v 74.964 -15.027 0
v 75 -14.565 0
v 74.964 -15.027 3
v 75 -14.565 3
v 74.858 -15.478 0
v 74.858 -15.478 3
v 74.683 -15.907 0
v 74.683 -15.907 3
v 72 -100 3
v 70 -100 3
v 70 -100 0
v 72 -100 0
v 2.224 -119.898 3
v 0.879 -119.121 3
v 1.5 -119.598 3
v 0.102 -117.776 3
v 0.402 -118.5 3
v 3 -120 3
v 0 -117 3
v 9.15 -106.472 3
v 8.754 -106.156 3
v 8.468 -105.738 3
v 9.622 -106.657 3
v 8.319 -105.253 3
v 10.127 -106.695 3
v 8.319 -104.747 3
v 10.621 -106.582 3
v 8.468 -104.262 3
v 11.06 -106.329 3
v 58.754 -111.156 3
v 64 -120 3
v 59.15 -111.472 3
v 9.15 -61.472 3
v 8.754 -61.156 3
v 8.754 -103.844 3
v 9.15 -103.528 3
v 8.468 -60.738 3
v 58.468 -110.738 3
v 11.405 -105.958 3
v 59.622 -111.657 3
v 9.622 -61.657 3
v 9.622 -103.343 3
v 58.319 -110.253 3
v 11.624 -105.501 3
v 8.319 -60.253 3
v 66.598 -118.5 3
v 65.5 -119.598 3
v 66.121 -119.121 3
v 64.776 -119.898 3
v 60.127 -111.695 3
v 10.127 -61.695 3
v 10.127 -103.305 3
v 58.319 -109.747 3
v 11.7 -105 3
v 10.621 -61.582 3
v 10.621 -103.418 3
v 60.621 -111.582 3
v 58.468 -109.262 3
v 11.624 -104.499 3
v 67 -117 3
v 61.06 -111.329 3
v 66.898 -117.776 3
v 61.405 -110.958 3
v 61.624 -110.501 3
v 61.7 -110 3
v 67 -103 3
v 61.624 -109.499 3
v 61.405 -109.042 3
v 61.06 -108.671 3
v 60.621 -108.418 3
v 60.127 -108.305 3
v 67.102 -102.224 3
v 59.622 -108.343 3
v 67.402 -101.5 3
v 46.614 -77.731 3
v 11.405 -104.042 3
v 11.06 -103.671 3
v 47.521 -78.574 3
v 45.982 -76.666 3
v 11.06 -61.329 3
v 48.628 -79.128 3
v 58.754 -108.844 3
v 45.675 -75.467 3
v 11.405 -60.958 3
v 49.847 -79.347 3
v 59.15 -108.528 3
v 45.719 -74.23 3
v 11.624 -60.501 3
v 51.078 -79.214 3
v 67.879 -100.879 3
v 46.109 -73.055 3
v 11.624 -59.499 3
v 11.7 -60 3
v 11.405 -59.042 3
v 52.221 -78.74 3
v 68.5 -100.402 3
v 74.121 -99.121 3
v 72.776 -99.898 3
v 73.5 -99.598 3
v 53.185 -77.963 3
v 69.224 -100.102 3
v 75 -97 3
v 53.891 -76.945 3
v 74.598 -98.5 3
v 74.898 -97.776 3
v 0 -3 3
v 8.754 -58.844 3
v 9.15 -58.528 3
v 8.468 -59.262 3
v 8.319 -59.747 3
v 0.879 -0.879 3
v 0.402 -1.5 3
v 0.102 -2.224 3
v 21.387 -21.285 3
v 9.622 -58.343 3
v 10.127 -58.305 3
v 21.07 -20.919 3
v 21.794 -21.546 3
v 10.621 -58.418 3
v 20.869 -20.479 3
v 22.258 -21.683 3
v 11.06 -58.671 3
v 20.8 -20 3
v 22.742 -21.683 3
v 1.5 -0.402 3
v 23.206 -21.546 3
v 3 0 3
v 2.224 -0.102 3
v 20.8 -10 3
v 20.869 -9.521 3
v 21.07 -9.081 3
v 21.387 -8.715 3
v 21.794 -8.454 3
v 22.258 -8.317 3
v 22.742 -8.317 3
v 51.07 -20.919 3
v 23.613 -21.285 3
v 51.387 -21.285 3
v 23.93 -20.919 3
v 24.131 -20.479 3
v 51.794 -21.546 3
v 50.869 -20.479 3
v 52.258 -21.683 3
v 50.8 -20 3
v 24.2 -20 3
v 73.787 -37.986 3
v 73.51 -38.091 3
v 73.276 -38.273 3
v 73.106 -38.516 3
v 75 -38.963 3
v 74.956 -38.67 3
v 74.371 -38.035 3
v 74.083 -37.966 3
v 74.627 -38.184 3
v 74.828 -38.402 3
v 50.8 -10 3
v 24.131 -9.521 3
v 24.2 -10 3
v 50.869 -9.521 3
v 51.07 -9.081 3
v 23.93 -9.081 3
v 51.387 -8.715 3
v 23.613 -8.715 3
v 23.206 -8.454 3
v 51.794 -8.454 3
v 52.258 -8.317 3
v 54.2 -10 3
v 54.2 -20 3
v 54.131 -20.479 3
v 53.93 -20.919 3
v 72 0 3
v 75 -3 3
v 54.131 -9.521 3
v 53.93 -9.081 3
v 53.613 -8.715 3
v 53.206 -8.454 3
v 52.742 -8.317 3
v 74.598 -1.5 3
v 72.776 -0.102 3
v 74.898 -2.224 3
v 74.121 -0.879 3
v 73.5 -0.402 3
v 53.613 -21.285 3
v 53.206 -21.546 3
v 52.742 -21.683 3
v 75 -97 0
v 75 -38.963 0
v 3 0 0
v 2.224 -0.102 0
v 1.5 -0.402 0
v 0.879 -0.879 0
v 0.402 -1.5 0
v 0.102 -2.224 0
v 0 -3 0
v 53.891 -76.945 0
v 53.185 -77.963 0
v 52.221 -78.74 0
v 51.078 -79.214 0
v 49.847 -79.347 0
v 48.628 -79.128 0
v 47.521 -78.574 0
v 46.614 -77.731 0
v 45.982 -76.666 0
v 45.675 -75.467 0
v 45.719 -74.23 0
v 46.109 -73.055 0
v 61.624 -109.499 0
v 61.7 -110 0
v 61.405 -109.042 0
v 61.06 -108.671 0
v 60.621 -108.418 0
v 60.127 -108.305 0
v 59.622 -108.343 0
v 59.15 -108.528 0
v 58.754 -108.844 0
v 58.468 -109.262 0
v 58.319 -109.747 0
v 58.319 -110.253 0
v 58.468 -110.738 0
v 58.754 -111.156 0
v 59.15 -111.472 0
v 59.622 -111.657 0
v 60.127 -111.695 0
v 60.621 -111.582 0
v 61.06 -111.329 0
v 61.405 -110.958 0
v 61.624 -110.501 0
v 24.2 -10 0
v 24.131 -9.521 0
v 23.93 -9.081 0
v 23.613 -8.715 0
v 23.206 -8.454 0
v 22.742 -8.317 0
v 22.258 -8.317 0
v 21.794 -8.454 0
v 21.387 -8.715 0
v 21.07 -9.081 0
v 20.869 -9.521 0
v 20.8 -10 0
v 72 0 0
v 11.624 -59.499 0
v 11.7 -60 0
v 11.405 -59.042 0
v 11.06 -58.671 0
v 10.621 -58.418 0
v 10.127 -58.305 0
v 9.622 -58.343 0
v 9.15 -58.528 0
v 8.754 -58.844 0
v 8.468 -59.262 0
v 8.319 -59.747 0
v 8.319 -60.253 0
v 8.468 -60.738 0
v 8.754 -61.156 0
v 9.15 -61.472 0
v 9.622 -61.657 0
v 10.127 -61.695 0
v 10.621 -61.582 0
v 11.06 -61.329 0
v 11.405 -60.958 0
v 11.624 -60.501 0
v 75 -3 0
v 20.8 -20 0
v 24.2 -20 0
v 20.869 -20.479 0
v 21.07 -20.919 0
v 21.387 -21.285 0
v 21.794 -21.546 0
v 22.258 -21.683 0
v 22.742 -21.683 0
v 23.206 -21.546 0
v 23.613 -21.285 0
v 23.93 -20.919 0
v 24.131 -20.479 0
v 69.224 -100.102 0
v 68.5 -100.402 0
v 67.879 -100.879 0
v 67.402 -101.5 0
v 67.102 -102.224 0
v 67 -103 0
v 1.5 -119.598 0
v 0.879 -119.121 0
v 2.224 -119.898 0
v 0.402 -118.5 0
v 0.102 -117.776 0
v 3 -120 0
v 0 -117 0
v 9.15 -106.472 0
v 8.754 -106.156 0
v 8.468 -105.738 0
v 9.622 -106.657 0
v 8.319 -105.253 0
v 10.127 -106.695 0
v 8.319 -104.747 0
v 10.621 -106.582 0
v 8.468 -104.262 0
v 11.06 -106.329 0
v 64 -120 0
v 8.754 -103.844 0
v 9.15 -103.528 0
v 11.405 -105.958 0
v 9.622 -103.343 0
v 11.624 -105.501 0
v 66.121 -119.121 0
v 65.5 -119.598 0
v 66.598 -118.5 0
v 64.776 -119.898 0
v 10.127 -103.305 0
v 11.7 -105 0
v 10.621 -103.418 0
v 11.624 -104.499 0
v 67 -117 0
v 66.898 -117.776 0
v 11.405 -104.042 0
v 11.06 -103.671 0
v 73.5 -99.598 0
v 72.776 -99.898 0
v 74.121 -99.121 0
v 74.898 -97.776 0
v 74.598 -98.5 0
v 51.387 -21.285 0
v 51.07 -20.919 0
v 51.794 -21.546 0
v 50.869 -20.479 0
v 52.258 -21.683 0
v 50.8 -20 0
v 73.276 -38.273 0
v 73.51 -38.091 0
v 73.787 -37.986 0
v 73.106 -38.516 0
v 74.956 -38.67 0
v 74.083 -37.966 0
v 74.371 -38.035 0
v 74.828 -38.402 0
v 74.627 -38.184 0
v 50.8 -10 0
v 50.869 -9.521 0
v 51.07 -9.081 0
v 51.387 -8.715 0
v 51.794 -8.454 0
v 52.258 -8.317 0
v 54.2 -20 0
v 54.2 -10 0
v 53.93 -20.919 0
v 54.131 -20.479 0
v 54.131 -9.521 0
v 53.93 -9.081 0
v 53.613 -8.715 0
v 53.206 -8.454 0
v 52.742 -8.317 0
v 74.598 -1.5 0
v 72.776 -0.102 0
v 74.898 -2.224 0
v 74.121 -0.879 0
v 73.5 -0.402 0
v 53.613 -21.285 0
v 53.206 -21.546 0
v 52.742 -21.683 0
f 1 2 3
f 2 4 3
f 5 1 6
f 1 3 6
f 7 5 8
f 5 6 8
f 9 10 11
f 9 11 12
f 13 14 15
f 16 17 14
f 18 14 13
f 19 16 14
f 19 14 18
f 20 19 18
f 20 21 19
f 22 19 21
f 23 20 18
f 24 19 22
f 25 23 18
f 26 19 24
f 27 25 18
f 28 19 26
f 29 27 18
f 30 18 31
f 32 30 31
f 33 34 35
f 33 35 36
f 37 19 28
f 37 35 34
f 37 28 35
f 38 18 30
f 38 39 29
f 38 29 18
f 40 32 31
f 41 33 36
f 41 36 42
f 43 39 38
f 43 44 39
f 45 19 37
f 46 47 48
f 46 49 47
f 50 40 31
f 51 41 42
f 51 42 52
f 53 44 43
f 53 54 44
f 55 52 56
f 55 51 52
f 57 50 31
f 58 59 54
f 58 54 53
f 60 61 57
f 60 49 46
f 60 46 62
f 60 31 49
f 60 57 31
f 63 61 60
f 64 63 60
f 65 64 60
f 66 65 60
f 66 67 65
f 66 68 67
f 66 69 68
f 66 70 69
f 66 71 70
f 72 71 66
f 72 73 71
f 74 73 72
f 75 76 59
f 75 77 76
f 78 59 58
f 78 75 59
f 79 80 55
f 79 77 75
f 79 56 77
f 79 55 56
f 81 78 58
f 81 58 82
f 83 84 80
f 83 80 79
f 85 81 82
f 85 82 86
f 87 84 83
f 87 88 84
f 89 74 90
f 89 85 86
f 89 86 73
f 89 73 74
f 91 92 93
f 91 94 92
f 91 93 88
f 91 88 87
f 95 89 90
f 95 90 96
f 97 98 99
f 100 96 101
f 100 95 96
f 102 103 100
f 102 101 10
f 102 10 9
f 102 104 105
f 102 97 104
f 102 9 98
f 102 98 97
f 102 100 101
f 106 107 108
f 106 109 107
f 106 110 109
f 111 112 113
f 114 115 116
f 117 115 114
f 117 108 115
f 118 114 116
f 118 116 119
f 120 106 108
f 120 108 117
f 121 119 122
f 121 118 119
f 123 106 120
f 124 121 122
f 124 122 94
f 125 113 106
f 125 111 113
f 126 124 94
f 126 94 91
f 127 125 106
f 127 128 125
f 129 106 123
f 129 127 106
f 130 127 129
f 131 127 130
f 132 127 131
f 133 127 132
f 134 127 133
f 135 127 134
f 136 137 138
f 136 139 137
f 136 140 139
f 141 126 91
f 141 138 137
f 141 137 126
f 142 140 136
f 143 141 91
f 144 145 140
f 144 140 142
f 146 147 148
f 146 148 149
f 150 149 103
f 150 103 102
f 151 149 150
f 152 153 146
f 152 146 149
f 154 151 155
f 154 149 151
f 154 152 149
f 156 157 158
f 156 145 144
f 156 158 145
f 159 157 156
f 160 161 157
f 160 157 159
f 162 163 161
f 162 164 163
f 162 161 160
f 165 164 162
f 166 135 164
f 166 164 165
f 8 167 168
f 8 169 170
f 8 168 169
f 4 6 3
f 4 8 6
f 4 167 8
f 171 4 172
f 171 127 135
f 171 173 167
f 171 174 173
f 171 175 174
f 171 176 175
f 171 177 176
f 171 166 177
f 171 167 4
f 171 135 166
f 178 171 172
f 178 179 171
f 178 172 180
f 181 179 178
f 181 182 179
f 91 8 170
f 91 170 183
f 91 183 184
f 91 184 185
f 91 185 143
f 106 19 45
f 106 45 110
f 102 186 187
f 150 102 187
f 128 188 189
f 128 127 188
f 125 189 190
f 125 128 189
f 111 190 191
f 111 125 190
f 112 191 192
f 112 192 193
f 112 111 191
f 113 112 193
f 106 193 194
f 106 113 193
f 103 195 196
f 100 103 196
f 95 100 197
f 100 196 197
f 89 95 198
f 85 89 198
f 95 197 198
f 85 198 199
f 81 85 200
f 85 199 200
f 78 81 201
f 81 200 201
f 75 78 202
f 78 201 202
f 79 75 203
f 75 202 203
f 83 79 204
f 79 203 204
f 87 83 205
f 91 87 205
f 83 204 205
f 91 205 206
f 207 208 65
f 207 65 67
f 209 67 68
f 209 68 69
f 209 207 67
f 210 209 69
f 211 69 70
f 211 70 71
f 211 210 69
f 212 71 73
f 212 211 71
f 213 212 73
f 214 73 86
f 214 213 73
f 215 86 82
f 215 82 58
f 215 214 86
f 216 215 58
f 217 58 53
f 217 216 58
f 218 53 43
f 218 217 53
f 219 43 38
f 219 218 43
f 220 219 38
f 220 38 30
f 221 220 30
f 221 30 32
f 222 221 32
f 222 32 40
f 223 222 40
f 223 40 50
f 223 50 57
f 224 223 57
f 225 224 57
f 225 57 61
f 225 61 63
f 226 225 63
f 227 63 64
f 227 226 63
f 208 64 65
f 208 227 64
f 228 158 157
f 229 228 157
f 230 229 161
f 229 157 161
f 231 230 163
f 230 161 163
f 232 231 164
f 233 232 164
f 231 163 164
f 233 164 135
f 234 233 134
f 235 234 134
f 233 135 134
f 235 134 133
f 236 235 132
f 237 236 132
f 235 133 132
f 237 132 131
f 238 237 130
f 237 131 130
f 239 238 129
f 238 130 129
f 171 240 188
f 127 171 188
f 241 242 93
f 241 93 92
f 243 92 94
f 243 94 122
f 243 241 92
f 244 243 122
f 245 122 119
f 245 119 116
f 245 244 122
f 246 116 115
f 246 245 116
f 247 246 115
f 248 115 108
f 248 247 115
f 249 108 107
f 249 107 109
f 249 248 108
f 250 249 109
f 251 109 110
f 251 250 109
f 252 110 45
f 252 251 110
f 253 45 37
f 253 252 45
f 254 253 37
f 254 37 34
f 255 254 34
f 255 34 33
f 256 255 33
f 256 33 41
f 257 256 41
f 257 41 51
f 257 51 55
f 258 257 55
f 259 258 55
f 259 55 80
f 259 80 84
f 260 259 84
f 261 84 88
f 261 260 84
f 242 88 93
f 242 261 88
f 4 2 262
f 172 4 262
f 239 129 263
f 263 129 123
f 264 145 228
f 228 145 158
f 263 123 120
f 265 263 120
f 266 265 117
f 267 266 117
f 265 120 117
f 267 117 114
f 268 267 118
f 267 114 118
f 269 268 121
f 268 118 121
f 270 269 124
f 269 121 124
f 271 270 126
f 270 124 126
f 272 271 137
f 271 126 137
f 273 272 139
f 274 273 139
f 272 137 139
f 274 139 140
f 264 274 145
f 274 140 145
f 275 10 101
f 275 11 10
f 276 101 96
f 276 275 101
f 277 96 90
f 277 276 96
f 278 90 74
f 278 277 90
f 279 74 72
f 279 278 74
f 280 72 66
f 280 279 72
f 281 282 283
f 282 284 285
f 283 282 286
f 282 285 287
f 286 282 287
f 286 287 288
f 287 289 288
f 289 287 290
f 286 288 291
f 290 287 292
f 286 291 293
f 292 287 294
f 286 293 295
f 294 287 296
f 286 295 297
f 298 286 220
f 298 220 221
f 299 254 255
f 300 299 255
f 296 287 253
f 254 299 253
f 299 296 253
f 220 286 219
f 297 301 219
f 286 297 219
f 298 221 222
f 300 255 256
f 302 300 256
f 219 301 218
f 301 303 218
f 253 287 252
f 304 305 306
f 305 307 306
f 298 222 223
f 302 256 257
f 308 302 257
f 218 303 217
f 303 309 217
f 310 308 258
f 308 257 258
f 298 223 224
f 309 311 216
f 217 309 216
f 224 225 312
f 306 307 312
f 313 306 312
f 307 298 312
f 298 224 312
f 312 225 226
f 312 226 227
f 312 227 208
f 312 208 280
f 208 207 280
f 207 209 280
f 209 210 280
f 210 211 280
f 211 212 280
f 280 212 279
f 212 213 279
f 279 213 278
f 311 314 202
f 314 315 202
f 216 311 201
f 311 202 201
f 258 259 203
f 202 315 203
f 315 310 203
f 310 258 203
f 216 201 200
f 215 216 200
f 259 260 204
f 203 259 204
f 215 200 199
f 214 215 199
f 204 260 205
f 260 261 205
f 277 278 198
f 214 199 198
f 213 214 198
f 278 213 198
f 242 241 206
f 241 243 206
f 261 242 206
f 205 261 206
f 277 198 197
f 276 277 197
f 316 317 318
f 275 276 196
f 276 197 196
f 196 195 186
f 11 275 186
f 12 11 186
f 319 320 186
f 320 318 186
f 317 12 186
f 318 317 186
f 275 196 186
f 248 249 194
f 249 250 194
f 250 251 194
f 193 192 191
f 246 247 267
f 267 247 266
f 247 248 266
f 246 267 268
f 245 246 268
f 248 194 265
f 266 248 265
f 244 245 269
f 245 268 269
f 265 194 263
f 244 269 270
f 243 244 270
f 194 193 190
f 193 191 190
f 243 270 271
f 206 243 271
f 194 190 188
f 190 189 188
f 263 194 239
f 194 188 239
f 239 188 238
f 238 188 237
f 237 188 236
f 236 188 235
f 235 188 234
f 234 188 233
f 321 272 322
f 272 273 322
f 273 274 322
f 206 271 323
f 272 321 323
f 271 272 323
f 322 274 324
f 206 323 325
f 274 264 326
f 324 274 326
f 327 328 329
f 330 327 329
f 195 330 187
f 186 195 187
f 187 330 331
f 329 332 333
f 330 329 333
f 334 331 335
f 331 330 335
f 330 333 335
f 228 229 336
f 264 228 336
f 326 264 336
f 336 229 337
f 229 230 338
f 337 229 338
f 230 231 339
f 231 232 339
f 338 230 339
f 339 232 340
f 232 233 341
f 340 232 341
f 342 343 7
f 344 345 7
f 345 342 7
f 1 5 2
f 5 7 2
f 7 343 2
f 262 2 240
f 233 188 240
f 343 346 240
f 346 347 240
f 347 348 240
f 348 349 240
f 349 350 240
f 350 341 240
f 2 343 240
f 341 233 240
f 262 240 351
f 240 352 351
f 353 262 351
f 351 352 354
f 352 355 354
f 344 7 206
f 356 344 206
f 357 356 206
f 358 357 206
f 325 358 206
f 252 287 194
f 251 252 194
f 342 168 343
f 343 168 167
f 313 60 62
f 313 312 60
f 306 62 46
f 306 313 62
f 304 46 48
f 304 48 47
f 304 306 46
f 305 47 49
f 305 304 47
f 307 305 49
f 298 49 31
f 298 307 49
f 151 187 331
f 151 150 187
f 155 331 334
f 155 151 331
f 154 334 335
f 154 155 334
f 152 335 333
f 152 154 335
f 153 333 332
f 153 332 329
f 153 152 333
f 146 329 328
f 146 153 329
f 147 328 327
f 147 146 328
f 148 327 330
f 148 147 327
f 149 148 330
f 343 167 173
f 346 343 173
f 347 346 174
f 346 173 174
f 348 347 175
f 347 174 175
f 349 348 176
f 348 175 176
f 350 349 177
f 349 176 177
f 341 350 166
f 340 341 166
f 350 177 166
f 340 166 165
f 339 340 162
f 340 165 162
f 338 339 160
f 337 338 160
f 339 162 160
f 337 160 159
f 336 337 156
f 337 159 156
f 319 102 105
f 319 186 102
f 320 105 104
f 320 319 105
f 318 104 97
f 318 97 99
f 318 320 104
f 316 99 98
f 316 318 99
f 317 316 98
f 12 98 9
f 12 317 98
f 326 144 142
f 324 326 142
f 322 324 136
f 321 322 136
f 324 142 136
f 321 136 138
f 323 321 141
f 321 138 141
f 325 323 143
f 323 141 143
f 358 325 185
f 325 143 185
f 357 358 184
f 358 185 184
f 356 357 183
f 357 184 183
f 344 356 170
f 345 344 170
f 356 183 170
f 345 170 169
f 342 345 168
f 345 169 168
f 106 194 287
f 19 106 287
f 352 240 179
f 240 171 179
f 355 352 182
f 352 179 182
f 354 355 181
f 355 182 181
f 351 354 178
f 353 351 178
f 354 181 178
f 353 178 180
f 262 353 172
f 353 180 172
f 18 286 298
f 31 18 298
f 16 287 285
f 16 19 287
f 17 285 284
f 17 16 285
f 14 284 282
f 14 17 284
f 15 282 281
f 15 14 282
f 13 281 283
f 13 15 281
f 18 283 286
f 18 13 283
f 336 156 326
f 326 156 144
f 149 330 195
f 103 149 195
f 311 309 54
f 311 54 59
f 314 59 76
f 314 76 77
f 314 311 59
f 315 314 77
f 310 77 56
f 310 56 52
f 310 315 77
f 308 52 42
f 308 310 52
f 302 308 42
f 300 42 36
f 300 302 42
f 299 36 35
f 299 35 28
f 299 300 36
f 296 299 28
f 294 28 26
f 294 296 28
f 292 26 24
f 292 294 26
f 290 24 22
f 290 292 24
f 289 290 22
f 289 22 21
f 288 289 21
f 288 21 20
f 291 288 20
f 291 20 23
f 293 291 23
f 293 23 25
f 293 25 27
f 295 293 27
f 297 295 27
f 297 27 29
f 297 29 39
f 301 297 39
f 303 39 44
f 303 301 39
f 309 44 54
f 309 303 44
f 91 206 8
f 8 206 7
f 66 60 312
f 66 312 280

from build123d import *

# Parameters (mm, degrees)
SKETCH1_R           = 1.7
BOSS_EXTRUDE1_DEPTH = 3
FILLET1_R           = 3
CUT_EXTRUDE1_DEPTH  = 4
SKETCH3_W           = 8
SKETCH3_H           = 20
CUT_EXTRUDE2_DEPTH  = 4
FILLET2_R           = 3
FILLET3_R           = 1


with BuildPart() as part:
    # Sketch1 → Boss-Extrude1 (new body)
    with BuildSketch(Plane.XY):
        with BuildLine():
            Line((75, 0), (0, 0))
            Line((0, 0), (0, -120))
            Line((0, -120), (75, -120))
            Line((75, -120), (75, -34.726895702))
            Line((75, -34.726895702), (63.890758281, -56.94537914))
            Line((63.890758281, -56.94537914), (53.890758281, -76.94537914))
            ThreePointArc((53.890758281, -76.94537914), (48.05462086, -78.890758281), (46.109241719, -73.05462086))
            Line((46.109241719, -73.05462086), (56.109241719, -53.05462086))
            Line((56.109241719, -53.05462086), (75, -15.273104298))
            Line((75, -15.273104298), (75, 0))
        make_face()
        with Locations((10, -105)):
            Circle(SKETCH1_R, mode=Mode.SUBTRACT)
        with Locations((60, -110)):
            Circle(SKETCH1_R, mode=Mode.SUBTRACT)
        with Locations((10, -60)):
            Circle(SKETCH1_R, mode=Mode.SUBTRACT)
    extrude(amount=BOSS_EXTRUDE1_DEPTH)

    # Fillet1
    fillet1_edges = [part.edges().sort_by_distance(p)[0] for p in [
        (75, -120, 1.5),
        (0, -120, 1.5),
        (0, 0, 1.5),
        (75, 0, 1.5),
        (75, -15.273104298, 1.5),
    ]]
    fillet(fillet1_edges, radius=FILLET1_R)

    # Sketch2 → Cut-Extrude1 (cut, through all)
    with BuildSketch(Plane.XY.offset(3)):
        with BuildLine():
            Line((20.8, -10), (20.8, -20))
            ThreePointArc((20.8, -20), (22.5, -21.7), (24.2, -20))
            Line((24.2, -20), (24.2, -10))
            ThreePointArc((24.2, -10), (22.5, -8.3), (20.8, -10))
        make_face()
        with BuildLine():
            Line((50.8, -10), (50.8, -20))
            ThreePointArc((50.8, -20), (52.5, -21.7), (54.2, -20))
            Line((54.2, -20), (54.2, -10))
            ThreePointArc((54.2, -10), (52.5, -8.3), (50.8, -10))
        make_face()
    extrude(amount=-CUT_EXTRUDE1_DEPTH, mode=Mode.SUBTRACT)

    # Sketch3 → Cut-Extrude2 (cut, through all)
    with BuildSketch(Plane.XY.offset(3)):
        with Locations((71, -110)):
            Rectangle(SKETCH3_W, SKETCH3_H)
    extrude(amount=-CUT_EXTRUDE2_DEPTH, mode=Mode.SUBTRACT)

    # Fillet2
    fillet2_edges = [part.edges().sort_by_distance(p)[0] for p in [
        (75, -100, 1.5),
        (67, -120, 1.5),
        (67, -100, 1.5),
    ]]
    fillet(fillet2_edges, radius=FILLET2_R)

    # Fillet3
    fillet3_edges = [part.edges().sort_by_distance(p)[0] for p in [
        (75, -34.726895702, 1.5),
    ]]
    fillet(fillet3_edges, radius=FILLET3_R)


solid = part.part
